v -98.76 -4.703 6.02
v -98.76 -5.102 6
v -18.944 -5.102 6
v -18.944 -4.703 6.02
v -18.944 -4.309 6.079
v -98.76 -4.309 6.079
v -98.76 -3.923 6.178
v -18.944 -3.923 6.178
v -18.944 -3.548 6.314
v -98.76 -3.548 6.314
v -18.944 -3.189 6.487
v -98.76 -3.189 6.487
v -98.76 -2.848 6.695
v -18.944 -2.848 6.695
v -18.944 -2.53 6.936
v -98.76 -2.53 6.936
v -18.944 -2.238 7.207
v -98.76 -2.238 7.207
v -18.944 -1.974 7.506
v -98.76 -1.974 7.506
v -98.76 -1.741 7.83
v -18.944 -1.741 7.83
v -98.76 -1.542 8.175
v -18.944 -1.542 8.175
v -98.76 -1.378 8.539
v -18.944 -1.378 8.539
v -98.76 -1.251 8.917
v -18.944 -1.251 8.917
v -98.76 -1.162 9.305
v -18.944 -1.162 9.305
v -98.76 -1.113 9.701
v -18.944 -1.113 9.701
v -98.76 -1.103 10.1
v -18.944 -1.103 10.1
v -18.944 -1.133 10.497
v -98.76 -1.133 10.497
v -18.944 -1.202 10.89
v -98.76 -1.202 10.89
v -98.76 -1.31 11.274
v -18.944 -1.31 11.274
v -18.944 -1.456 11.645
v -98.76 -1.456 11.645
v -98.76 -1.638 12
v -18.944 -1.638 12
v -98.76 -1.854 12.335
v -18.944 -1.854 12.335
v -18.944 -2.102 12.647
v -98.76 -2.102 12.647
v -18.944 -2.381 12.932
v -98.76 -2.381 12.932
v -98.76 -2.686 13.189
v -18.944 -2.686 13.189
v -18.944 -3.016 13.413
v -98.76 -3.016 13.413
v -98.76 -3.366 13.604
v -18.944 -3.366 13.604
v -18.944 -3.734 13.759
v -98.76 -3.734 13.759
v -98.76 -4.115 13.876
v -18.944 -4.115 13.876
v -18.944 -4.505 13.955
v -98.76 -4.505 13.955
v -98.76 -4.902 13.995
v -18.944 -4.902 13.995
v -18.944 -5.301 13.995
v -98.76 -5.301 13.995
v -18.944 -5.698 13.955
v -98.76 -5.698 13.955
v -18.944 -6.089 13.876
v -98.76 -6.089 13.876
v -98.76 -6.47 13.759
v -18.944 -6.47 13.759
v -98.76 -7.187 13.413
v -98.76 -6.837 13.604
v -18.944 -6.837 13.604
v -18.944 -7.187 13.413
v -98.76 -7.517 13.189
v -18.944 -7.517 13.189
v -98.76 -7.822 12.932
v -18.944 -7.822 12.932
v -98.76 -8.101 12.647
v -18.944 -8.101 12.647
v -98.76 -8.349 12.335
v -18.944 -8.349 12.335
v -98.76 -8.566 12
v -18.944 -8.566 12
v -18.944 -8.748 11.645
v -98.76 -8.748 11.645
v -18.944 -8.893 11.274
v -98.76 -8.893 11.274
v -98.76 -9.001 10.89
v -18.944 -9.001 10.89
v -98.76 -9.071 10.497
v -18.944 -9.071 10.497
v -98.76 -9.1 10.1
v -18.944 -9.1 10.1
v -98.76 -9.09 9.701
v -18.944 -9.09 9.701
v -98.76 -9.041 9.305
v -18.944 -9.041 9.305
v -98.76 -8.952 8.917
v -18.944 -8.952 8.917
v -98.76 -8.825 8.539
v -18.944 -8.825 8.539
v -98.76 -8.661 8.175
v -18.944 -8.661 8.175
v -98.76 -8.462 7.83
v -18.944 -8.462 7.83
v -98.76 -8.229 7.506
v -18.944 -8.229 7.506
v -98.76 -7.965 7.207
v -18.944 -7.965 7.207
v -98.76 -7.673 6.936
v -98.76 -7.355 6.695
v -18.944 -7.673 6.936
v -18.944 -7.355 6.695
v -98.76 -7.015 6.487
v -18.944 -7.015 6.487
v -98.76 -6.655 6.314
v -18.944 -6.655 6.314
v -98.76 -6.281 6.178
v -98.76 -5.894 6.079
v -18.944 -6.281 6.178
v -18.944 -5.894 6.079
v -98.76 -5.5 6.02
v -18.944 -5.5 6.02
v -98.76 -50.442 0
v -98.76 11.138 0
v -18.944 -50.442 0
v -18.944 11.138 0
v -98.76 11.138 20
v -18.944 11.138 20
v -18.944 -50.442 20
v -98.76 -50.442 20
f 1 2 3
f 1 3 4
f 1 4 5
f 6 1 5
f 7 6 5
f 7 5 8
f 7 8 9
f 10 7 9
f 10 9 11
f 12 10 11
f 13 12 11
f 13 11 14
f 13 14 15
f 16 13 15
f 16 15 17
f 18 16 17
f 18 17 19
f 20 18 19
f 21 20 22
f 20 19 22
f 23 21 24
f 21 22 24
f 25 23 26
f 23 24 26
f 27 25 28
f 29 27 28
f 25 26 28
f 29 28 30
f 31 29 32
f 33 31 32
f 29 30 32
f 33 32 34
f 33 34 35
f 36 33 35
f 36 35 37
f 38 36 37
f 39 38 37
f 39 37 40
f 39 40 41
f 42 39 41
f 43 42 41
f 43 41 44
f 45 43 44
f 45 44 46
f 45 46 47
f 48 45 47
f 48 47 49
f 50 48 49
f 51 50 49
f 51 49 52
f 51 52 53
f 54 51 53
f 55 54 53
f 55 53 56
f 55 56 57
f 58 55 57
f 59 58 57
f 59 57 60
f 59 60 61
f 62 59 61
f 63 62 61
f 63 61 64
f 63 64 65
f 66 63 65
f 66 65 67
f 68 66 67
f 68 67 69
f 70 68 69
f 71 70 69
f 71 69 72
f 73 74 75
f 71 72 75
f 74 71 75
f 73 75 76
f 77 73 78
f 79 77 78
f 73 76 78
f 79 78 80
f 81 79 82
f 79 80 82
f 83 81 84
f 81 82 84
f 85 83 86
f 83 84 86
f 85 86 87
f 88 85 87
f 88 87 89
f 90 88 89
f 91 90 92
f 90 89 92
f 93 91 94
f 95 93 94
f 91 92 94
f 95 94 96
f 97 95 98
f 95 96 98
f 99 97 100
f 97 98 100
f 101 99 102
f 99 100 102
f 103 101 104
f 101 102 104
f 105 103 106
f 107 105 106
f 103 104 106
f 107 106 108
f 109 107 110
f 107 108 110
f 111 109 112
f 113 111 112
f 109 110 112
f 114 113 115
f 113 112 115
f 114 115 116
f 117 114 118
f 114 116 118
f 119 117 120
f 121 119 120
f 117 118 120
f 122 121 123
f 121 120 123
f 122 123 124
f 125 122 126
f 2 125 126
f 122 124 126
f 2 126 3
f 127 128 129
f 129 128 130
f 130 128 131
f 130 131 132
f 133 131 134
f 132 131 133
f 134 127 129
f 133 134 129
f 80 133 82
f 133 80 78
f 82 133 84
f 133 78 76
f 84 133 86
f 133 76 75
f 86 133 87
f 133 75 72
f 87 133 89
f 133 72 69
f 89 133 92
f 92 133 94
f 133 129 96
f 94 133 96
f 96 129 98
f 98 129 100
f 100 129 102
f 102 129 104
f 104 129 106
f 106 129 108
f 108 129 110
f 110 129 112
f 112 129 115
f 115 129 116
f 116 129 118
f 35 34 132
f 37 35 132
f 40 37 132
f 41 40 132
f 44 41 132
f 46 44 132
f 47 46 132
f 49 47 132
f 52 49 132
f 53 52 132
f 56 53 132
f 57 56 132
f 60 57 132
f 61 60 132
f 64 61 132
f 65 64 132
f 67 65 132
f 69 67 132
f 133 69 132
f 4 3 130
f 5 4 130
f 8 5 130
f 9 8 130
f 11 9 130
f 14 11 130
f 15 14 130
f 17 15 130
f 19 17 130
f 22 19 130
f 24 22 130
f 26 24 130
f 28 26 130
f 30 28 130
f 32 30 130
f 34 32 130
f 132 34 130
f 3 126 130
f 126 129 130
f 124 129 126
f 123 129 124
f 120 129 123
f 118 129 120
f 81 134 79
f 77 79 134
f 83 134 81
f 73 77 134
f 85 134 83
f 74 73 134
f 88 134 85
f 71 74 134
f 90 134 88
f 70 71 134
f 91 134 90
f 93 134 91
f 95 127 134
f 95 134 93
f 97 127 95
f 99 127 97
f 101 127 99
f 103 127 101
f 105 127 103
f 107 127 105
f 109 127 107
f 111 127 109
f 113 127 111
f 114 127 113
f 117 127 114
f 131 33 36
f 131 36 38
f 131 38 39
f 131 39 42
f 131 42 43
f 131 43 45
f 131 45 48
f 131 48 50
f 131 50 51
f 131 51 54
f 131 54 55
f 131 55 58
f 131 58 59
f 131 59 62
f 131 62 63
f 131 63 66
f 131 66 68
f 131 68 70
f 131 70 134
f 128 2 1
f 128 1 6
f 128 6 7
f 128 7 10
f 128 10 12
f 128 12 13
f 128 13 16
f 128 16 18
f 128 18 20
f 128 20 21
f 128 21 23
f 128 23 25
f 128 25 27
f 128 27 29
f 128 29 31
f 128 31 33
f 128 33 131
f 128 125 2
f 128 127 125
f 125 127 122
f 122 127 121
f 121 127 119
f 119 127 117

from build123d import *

# Parameters (mm, degrees)
SKETCH1_W           = 79.816604327
SKETCH1_H           = 61.580684207
BOSS_EXTRUDE1_DEPTH = 20
CUT_EXTRUDE1_START  = -18.943875
SKETCH3_R           = 4
CUT_EXTRUDE1_DEPTH  = 80.816604514


with BuildPart() as part:
    # Sketch1 → Boss-Extrude1 (new body)
    with BuildSketch(Plane.XY):
        with Locations((-58.852177351, -19.652156424)):
            Rectangle(SKETCH1_W, SKETCH1_H)
    extrude(amount=BOSS_EXTRUDE1_DEPTH)

    # Sketch3 → Cut-Extrude1 (cut, through all)
    with BuildSketch(Plane(origin=(0, 0, 0), x_dir=(0, 0, -1), z_dir=(1, 0, 0)).offset(CUT_EXTRUDE1_START)):
        with Locations((-10, -5.101602078)):
            Circle(SKETCH3_R)
    extrude(amount=-CUT_EXTRUDE1_DEPTH, mode=Mode.SUBTRACT)


solid = part.part
